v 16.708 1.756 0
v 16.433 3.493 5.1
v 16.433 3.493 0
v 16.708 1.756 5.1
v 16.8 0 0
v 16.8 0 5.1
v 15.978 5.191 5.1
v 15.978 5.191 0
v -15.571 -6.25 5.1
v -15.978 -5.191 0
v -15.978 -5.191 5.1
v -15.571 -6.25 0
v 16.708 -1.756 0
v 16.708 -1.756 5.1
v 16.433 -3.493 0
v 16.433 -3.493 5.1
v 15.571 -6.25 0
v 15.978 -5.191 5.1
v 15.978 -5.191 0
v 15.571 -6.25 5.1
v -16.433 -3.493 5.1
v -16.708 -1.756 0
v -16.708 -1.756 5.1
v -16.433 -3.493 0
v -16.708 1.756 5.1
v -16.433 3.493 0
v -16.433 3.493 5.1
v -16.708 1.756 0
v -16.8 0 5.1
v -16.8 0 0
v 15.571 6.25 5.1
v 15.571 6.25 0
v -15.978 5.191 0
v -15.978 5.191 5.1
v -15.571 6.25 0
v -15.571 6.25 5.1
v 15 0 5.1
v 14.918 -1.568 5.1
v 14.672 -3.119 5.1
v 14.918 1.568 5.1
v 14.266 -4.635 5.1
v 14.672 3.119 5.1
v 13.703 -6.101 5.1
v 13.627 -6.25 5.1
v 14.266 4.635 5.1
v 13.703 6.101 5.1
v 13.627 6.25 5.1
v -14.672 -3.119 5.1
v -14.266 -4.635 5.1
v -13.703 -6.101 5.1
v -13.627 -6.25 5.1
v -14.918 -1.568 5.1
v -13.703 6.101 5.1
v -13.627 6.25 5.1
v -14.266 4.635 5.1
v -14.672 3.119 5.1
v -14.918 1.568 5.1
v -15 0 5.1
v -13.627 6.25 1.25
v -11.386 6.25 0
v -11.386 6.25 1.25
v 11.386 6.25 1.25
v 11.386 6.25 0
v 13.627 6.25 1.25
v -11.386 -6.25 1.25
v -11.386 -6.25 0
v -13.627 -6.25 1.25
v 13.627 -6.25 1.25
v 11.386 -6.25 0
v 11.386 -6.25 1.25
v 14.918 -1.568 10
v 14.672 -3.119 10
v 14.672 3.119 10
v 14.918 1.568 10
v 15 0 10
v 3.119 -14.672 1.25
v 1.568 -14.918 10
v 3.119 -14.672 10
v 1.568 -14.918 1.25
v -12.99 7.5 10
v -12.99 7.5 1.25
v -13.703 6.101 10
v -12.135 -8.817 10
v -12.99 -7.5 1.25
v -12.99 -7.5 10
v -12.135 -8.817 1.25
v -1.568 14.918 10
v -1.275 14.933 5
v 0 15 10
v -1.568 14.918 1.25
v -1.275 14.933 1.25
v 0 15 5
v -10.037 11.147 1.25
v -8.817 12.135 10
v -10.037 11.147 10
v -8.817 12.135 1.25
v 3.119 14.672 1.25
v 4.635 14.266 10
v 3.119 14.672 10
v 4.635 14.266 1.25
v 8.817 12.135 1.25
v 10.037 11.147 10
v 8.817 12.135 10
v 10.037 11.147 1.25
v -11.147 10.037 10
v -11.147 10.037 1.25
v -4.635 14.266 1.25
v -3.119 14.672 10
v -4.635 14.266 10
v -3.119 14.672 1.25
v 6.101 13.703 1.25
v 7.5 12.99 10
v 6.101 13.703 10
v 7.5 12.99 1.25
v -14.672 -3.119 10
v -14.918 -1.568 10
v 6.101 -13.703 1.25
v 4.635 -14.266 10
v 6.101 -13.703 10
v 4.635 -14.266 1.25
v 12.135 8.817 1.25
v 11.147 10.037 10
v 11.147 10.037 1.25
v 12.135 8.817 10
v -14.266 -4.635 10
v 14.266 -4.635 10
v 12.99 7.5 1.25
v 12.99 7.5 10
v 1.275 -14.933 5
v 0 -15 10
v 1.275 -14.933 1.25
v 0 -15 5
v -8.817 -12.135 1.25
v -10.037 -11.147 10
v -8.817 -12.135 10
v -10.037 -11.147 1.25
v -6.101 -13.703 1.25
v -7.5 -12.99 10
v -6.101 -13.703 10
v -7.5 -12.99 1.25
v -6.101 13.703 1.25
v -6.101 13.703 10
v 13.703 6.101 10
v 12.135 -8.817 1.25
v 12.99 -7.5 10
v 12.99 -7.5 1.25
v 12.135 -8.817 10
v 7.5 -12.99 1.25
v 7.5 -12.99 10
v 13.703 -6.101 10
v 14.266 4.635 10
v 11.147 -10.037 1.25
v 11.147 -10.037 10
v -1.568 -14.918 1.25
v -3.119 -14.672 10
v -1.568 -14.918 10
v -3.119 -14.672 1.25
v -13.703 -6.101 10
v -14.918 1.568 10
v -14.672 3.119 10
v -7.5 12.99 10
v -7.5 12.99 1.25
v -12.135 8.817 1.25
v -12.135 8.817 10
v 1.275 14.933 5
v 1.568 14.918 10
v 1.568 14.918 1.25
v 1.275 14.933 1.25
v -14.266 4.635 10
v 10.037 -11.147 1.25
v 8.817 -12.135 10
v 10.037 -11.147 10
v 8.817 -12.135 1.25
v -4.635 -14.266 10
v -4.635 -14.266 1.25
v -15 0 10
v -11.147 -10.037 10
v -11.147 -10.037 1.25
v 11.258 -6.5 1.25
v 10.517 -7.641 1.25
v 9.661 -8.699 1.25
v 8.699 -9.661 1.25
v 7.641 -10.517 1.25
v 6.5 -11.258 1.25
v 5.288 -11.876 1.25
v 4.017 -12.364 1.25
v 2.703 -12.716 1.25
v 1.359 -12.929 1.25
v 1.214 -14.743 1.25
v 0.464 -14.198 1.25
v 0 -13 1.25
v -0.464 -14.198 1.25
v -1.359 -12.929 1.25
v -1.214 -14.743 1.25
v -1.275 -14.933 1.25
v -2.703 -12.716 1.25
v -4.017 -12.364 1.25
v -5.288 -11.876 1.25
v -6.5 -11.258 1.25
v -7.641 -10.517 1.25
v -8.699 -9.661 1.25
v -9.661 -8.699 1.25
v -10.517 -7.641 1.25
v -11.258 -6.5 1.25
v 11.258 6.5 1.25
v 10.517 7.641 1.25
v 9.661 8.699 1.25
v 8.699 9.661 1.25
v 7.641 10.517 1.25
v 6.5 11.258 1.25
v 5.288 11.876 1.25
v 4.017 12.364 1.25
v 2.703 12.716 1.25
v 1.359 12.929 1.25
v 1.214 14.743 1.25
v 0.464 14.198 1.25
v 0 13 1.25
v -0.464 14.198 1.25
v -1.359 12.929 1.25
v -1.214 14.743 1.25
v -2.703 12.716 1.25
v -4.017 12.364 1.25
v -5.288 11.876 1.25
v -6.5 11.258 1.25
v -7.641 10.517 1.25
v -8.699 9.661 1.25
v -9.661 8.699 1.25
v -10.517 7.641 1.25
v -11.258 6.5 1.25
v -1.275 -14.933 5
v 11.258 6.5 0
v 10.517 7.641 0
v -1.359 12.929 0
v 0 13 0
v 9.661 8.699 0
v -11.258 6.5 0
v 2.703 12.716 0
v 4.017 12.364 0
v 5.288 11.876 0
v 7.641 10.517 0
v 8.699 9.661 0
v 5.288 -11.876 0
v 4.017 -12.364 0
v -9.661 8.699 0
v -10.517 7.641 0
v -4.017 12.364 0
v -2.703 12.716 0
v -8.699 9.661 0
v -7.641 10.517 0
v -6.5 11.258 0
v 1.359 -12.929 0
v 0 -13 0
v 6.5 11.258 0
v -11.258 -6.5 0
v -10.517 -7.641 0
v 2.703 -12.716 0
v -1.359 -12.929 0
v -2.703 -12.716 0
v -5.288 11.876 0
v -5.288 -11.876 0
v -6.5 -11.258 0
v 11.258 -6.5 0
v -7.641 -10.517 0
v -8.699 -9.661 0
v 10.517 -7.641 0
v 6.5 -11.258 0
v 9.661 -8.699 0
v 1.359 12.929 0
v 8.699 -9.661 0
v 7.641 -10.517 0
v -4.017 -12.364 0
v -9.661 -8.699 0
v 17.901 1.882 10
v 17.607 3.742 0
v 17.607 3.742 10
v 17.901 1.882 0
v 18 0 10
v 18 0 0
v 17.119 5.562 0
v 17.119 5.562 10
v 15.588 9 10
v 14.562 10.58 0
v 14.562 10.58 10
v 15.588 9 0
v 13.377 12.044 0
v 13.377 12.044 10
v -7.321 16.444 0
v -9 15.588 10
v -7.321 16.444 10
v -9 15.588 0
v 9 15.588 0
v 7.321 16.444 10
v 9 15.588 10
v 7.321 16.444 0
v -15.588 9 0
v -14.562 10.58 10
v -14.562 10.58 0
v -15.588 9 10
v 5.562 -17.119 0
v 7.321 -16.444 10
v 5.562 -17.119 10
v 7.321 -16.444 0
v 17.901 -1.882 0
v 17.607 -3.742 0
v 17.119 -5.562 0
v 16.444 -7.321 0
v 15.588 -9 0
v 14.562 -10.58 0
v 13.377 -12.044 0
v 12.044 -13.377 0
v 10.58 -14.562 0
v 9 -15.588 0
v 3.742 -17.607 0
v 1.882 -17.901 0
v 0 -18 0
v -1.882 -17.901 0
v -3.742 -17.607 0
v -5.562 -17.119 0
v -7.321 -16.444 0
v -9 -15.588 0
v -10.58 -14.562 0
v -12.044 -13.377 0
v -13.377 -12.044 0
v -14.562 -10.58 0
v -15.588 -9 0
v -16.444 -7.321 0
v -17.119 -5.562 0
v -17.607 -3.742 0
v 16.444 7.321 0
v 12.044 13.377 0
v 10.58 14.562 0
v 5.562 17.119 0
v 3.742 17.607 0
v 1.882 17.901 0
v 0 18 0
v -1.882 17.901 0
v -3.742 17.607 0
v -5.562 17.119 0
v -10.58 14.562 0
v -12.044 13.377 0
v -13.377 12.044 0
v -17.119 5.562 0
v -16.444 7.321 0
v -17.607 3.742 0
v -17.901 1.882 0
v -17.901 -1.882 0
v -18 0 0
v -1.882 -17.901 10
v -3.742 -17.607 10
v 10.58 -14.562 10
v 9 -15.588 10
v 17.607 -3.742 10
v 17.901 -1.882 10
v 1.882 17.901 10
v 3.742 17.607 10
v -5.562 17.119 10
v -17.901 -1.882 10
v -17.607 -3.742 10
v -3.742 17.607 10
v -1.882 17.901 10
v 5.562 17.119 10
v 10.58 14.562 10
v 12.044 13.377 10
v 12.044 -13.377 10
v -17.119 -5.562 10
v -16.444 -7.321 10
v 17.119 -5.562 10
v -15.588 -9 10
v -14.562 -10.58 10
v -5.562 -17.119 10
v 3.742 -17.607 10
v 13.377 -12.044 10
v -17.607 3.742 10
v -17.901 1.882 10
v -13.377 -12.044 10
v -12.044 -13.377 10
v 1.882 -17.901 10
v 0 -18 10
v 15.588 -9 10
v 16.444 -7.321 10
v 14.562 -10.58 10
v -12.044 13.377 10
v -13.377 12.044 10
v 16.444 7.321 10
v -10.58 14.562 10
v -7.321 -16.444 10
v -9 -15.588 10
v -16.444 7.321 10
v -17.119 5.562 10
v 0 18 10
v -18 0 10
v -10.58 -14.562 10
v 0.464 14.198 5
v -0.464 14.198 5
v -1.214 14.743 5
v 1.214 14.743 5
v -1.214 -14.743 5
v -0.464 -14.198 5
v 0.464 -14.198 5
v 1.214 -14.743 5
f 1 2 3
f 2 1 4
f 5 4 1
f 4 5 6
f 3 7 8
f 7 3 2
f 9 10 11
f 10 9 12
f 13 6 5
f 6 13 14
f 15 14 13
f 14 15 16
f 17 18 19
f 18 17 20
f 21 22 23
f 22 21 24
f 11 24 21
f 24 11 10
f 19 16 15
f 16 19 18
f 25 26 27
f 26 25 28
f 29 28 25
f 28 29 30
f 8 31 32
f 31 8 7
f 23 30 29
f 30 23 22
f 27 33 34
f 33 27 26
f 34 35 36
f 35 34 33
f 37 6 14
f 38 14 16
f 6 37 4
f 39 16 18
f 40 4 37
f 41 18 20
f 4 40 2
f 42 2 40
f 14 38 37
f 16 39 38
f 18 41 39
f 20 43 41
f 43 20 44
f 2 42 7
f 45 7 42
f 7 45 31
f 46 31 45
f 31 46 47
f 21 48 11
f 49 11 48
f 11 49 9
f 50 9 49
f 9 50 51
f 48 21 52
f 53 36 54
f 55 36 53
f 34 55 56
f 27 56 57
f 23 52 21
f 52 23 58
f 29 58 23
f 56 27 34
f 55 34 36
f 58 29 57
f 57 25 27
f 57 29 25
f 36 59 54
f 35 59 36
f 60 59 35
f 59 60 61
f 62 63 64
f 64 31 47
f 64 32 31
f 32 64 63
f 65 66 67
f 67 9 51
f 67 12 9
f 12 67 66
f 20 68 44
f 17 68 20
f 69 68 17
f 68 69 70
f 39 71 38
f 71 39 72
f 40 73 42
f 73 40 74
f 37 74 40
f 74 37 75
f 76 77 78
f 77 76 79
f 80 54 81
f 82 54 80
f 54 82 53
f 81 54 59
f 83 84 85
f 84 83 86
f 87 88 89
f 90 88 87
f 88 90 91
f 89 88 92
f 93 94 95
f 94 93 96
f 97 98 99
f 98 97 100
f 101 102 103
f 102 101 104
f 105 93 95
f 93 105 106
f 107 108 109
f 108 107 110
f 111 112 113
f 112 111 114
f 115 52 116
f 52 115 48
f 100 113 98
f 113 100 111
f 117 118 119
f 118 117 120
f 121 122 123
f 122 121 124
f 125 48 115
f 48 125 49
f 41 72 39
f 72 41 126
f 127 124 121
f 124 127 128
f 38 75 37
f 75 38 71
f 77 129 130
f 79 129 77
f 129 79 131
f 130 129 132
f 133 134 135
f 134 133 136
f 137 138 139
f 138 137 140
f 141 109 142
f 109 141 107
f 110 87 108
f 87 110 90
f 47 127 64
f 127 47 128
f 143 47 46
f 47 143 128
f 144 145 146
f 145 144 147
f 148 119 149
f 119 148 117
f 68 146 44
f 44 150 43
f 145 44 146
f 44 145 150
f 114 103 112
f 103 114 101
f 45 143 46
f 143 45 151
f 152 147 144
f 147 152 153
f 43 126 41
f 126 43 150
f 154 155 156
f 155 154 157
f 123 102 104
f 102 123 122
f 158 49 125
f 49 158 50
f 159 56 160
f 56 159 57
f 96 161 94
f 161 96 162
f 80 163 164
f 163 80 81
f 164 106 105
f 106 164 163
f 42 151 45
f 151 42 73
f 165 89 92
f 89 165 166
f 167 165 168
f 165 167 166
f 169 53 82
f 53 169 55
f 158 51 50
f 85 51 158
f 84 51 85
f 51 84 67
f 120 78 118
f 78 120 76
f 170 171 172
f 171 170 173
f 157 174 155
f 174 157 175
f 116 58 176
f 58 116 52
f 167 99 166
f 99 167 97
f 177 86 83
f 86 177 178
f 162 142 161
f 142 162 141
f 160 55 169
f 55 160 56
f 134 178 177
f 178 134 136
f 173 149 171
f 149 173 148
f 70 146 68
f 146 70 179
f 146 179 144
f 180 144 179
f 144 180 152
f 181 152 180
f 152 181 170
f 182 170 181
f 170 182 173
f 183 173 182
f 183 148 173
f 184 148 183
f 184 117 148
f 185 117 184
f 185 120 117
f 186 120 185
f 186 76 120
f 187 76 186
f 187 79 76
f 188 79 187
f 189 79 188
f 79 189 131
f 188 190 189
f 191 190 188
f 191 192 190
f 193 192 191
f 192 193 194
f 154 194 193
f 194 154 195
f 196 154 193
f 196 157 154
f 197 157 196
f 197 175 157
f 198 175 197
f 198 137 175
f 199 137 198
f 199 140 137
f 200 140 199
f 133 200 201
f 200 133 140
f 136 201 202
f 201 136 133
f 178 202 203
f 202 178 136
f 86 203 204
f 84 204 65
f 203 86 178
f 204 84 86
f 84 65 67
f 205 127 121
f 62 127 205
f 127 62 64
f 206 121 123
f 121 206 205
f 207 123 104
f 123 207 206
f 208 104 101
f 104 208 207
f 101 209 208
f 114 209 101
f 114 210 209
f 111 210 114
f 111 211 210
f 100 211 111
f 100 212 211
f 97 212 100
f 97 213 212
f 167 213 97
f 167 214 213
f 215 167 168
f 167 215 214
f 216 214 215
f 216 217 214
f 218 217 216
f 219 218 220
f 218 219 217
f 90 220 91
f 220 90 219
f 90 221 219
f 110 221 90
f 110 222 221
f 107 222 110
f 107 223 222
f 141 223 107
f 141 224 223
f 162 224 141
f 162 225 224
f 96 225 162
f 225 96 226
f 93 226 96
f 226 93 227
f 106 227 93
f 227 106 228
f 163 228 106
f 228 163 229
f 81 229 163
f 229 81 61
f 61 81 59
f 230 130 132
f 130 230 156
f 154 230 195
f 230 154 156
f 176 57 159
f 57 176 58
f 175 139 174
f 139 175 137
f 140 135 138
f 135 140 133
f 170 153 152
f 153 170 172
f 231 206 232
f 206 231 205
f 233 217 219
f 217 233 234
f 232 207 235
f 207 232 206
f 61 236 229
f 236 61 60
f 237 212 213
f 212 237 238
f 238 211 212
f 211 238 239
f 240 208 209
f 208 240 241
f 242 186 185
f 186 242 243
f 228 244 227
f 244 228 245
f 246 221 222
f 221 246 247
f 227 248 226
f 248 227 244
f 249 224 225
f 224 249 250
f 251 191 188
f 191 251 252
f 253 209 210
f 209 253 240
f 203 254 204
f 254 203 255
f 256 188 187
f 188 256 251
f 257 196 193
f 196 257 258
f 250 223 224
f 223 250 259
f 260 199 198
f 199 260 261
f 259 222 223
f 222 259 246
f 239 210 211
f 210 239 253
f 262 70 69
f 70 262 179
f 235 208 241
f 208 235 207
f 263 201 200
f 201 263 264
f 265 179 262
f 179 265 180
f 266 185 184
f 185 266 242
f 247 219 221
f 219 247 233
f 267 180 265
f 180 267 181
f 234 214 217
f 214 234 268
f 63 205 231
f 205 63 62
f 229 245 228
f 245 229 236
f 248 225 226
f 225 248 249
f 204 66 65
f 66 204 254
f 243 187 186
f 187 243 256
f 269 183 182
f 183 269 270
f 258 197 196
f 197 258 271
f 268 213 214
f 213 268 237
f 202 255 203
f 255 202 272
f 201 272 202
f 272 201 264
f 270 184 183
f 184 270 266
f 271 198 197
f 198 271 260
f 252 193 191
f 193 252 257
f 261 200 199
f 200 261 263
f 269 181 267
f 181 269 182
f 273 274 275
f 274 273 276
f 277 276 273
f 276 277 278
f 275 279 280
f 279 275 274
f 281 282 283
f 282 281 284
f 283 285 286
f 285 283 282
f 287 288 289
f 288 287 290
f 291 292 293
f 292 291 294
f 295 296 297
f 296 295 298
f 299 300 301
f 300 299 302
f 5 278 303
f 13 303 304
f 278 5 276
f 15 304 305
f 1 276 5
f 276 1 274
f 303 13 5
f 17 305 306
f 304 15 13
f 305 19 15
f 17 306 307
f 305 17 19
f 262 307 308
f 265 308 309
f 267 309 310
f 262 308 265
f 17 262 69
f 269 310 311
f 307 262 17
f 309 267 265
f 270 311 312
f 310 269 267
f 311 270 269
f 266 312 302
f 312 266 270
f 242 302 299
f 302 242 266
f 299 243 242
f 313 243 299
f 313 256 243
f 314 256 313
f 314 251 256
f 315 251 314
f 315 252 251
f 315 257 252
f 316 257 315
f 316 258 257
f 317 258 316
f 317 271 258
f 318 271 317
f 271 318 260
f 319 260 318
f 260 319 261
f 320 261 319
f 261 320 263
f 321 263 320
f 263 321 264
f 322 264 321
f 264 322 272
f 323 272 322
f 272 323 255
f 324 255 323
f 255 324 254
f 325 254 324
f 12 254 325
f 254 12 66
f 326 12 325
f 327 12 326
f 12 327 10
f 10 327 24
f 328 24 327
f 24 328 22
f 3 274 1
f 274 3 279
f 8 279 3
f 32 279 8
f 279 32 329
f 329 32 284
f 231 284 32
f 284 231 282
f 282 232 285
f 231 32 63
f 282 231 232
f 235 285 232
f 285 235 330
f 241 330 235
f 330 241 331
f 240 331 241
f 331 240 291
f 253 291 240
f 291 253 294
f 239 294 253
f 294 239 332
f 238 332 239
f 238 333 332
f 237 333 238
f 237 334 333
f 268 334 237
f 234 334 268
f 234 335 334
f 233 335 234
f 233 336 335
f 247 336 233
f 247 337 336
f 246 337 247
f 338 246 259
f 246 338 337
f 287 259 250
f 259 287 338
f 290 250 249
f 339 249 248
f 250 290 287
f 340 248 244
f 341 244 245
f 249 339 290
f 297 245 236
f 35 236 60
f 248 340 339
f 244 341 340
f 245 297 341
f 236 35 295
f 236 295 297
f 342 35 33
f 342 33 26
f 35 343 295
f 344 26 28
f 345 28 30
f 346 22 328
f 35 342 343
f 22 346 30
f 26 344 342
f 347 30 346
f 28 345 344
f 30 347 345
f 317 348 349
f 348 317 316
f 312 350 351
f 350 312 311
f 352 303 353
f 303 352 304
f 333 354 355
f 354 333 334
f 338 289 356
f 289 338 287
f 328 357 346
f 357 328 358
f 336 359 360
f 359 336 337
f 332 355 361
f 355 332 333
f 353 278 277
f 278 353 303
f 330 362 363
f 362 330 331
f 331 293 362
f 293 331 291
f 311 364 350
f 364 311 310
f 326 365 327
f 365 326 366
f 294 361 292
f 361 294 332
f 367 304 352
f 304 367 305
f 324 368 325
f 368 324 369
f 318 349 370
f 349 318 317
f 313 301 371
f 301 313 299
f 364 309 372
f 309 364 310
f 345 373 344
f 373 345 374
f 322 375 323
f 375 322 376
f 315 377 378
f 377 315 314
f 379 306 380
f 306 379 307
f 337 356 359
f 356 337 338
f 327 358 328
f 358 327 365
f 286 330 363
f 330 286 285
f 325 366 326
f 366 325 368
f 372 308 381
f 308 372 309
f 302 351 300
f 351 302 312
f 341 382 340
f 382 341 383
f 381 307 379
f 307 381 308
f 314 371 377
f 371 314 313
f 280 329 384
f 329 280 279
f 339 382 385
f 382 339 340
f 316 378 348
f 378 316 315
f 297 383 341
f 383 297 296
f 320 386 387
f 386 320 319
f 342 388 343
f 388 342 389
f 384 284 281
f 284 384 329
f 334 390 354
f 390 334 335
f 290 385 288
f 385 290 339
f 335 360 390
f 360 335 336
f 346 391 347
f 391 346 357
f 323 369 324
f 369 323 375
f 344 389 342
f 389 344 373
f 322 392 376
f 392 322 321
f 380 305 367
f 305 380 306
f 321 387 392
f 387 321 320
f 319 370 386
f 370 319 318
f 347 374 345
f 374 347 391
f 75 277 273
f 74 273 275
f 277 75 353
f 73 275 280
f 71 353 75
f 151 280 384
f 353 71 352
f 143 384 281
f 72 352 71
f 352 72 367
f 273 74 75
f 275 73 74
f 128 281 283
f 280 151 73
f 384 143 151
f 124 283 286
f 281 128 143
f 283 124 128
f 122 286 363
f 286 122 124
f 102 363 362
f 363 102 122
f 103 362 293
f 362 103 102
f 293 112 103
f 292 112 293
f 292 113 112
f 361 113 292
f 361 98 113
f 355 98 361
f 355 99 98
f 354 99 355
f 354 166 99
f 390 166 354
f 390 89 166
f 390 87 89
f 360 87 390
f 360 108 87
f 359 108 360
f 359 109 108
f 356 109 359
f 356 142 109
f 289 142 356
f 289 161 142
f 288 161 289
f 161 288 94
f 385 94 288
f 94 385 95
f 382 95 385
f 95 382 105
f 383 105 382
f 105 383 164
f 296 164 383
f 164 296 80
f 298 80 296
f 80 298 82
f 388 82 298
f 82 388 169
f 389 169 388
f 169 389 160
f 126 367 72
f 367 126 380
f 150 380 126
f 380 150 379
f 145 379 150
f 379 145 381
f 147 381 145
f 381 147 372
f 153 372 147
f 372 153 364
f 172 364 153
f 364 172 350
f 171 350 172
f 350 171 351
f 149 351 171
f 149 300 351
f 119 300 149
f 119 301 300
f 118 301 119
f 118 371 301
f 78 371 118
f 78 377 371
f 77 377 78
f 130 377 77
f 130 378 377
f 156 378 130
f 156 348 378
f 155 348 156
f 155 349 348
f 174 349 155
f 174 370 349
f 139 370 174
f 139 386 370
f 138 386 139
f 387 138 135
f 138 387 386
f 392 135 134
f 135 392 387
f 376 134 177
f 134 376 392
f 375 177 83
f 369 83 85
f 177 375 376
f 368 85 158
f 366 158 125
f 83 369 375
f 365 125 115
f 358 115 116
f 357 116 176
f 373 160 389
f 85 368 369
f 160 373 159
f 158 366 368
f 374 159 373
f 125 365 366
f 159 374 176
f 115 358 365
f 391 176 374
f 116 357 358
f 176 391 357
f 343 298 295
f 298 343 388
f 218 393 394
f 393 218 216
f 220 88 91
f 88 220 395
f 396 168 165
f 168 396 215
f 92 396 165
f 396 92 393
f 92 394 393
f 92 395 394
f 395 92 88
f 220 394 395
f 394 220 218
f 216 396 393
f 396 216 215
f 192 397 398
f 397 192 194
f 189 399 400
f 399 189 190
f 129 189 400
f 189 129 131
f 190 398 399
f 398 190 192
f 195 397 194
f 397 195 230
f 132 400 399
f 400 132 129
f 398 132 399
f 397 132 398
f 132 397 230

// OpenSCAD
$fs = 1;
$fa = 6;

module index(inflate = 0) {
    xoffset = 20;
    difference() {
        hull() {
            scale([1,1,1]) holderBody();
            translate([xoffset,0,0]) cylinder(d=10, h=10, center=false);
        }
        shell();
        translate([xoffset+1,0,0]) cylinder(d=3, h=100, center=true);
    }
}

module shell(inflate=0) {
    cylinder(d=36 + inflate, h=10, center=false, $fn=60);
}
module bodyCutouts() {
    // form the lip that holds the cleat tabs
    translate([0,0,1.25]) cylinder(d=30, h=100, center=false, $fn=60);
    // make the through-hole for the cleat body
    cylinder(d=26, h=100, center=true, $fn=60);
    // make the cutout to insert the cleat tabs
    cleatTabs(5, 1.5, 5.1);
}
module bodyAdditions() {
    translate([0, 31.25/2, 0]) cylinder(d=3, h=5, center=false);
    translate([0, -31.25/2, 0]) cylinder(d=3, h=5, center=false);
}
module holderBody() {
    difference() {
        shell();
        bodyCutouts();
    }
    bodyAdditions();
}
module cleatSmallCyl(height=3, inflate = 0) {
    cylinder(d=inflate + 24.9, h=height, center=false, $fn=60);
}
module cleatLargeCyl(h=1.5, inflate = 0) {
    cylinder(d=inflate + 28.6, h=h, center=false, $fn=60);
}
module cleatTabs(inflateX = 0, inflateY = 0, height = 1.5) {
    intersection() {
        translate([0, 0, -1]) cleatLargeCyl(height + 1, inflateX);
        cube([100, 11 + inflateY, 100], center=true);
    }
}
module indent(depth = 1, inflateX= 0, inflateY = 0) {
    hull() {
        translate([11.95 + inflateX, 0, 0]) cube([0.1, 2.5 + inflateY, depth * 2], center=true);
        translate([0, 0, -1.1]) cube([1, 0.1, 0.1], center=true);
    }
}
module indents(depth = 1) {
    indent(depth);
    rotate([0, 0, 180]) indent(depth);
}
module cleat() {
    cleatSmallCyl(3);
    cleatTabs();
}

module insertIndent(depth = 1, inflateX= 0, inflateY = 0) {
    yy = 2.45/2;
    rotate([0, 0, 90]) hull() {
        translate([11.95 + inflateX, 0, 0]) {
            cube([0.1, 1, depth * 2], center=true);
            translate([0, yy, 0]) cube([0.1, 0.1, 0.1], center=true);
            translate([0, -yy, 0]) cube([0.1, 0.1, 0.1], center=true);
        }
        translate([0, 0, -1.1]) cube([1, 0.1, 0.1], center=true);
    }
}

module insert() {
    // glue-in insert to secure the cleat
    difference() {
        union() {
            cleatSmallCyl(height = 2, inflate = -0.5);
            cleatTabs(4, 0.5, height = 2);
            rotate([0, 180, 0]) insertIndent(1, -0.75, -0.5);
            rotate([0, 180, 180]) insertIndent(1, -0.75, -0.5);
        }
        // make bendy wing things
        difference() {
            cube([9, 100, 100], center = true);
            cube([7.5, 100, 100], center = true);
            cube([100, 10, 100], center = true);
        }
        cylinder(d=5, h=10, center=true);
    }
}

*translate([0, 0, 2.75]) rotate([0, 180, 90]) difference() {
    cleat();
    indents(1);
}
holderBody();
*translate([0,0,3]) insert();
